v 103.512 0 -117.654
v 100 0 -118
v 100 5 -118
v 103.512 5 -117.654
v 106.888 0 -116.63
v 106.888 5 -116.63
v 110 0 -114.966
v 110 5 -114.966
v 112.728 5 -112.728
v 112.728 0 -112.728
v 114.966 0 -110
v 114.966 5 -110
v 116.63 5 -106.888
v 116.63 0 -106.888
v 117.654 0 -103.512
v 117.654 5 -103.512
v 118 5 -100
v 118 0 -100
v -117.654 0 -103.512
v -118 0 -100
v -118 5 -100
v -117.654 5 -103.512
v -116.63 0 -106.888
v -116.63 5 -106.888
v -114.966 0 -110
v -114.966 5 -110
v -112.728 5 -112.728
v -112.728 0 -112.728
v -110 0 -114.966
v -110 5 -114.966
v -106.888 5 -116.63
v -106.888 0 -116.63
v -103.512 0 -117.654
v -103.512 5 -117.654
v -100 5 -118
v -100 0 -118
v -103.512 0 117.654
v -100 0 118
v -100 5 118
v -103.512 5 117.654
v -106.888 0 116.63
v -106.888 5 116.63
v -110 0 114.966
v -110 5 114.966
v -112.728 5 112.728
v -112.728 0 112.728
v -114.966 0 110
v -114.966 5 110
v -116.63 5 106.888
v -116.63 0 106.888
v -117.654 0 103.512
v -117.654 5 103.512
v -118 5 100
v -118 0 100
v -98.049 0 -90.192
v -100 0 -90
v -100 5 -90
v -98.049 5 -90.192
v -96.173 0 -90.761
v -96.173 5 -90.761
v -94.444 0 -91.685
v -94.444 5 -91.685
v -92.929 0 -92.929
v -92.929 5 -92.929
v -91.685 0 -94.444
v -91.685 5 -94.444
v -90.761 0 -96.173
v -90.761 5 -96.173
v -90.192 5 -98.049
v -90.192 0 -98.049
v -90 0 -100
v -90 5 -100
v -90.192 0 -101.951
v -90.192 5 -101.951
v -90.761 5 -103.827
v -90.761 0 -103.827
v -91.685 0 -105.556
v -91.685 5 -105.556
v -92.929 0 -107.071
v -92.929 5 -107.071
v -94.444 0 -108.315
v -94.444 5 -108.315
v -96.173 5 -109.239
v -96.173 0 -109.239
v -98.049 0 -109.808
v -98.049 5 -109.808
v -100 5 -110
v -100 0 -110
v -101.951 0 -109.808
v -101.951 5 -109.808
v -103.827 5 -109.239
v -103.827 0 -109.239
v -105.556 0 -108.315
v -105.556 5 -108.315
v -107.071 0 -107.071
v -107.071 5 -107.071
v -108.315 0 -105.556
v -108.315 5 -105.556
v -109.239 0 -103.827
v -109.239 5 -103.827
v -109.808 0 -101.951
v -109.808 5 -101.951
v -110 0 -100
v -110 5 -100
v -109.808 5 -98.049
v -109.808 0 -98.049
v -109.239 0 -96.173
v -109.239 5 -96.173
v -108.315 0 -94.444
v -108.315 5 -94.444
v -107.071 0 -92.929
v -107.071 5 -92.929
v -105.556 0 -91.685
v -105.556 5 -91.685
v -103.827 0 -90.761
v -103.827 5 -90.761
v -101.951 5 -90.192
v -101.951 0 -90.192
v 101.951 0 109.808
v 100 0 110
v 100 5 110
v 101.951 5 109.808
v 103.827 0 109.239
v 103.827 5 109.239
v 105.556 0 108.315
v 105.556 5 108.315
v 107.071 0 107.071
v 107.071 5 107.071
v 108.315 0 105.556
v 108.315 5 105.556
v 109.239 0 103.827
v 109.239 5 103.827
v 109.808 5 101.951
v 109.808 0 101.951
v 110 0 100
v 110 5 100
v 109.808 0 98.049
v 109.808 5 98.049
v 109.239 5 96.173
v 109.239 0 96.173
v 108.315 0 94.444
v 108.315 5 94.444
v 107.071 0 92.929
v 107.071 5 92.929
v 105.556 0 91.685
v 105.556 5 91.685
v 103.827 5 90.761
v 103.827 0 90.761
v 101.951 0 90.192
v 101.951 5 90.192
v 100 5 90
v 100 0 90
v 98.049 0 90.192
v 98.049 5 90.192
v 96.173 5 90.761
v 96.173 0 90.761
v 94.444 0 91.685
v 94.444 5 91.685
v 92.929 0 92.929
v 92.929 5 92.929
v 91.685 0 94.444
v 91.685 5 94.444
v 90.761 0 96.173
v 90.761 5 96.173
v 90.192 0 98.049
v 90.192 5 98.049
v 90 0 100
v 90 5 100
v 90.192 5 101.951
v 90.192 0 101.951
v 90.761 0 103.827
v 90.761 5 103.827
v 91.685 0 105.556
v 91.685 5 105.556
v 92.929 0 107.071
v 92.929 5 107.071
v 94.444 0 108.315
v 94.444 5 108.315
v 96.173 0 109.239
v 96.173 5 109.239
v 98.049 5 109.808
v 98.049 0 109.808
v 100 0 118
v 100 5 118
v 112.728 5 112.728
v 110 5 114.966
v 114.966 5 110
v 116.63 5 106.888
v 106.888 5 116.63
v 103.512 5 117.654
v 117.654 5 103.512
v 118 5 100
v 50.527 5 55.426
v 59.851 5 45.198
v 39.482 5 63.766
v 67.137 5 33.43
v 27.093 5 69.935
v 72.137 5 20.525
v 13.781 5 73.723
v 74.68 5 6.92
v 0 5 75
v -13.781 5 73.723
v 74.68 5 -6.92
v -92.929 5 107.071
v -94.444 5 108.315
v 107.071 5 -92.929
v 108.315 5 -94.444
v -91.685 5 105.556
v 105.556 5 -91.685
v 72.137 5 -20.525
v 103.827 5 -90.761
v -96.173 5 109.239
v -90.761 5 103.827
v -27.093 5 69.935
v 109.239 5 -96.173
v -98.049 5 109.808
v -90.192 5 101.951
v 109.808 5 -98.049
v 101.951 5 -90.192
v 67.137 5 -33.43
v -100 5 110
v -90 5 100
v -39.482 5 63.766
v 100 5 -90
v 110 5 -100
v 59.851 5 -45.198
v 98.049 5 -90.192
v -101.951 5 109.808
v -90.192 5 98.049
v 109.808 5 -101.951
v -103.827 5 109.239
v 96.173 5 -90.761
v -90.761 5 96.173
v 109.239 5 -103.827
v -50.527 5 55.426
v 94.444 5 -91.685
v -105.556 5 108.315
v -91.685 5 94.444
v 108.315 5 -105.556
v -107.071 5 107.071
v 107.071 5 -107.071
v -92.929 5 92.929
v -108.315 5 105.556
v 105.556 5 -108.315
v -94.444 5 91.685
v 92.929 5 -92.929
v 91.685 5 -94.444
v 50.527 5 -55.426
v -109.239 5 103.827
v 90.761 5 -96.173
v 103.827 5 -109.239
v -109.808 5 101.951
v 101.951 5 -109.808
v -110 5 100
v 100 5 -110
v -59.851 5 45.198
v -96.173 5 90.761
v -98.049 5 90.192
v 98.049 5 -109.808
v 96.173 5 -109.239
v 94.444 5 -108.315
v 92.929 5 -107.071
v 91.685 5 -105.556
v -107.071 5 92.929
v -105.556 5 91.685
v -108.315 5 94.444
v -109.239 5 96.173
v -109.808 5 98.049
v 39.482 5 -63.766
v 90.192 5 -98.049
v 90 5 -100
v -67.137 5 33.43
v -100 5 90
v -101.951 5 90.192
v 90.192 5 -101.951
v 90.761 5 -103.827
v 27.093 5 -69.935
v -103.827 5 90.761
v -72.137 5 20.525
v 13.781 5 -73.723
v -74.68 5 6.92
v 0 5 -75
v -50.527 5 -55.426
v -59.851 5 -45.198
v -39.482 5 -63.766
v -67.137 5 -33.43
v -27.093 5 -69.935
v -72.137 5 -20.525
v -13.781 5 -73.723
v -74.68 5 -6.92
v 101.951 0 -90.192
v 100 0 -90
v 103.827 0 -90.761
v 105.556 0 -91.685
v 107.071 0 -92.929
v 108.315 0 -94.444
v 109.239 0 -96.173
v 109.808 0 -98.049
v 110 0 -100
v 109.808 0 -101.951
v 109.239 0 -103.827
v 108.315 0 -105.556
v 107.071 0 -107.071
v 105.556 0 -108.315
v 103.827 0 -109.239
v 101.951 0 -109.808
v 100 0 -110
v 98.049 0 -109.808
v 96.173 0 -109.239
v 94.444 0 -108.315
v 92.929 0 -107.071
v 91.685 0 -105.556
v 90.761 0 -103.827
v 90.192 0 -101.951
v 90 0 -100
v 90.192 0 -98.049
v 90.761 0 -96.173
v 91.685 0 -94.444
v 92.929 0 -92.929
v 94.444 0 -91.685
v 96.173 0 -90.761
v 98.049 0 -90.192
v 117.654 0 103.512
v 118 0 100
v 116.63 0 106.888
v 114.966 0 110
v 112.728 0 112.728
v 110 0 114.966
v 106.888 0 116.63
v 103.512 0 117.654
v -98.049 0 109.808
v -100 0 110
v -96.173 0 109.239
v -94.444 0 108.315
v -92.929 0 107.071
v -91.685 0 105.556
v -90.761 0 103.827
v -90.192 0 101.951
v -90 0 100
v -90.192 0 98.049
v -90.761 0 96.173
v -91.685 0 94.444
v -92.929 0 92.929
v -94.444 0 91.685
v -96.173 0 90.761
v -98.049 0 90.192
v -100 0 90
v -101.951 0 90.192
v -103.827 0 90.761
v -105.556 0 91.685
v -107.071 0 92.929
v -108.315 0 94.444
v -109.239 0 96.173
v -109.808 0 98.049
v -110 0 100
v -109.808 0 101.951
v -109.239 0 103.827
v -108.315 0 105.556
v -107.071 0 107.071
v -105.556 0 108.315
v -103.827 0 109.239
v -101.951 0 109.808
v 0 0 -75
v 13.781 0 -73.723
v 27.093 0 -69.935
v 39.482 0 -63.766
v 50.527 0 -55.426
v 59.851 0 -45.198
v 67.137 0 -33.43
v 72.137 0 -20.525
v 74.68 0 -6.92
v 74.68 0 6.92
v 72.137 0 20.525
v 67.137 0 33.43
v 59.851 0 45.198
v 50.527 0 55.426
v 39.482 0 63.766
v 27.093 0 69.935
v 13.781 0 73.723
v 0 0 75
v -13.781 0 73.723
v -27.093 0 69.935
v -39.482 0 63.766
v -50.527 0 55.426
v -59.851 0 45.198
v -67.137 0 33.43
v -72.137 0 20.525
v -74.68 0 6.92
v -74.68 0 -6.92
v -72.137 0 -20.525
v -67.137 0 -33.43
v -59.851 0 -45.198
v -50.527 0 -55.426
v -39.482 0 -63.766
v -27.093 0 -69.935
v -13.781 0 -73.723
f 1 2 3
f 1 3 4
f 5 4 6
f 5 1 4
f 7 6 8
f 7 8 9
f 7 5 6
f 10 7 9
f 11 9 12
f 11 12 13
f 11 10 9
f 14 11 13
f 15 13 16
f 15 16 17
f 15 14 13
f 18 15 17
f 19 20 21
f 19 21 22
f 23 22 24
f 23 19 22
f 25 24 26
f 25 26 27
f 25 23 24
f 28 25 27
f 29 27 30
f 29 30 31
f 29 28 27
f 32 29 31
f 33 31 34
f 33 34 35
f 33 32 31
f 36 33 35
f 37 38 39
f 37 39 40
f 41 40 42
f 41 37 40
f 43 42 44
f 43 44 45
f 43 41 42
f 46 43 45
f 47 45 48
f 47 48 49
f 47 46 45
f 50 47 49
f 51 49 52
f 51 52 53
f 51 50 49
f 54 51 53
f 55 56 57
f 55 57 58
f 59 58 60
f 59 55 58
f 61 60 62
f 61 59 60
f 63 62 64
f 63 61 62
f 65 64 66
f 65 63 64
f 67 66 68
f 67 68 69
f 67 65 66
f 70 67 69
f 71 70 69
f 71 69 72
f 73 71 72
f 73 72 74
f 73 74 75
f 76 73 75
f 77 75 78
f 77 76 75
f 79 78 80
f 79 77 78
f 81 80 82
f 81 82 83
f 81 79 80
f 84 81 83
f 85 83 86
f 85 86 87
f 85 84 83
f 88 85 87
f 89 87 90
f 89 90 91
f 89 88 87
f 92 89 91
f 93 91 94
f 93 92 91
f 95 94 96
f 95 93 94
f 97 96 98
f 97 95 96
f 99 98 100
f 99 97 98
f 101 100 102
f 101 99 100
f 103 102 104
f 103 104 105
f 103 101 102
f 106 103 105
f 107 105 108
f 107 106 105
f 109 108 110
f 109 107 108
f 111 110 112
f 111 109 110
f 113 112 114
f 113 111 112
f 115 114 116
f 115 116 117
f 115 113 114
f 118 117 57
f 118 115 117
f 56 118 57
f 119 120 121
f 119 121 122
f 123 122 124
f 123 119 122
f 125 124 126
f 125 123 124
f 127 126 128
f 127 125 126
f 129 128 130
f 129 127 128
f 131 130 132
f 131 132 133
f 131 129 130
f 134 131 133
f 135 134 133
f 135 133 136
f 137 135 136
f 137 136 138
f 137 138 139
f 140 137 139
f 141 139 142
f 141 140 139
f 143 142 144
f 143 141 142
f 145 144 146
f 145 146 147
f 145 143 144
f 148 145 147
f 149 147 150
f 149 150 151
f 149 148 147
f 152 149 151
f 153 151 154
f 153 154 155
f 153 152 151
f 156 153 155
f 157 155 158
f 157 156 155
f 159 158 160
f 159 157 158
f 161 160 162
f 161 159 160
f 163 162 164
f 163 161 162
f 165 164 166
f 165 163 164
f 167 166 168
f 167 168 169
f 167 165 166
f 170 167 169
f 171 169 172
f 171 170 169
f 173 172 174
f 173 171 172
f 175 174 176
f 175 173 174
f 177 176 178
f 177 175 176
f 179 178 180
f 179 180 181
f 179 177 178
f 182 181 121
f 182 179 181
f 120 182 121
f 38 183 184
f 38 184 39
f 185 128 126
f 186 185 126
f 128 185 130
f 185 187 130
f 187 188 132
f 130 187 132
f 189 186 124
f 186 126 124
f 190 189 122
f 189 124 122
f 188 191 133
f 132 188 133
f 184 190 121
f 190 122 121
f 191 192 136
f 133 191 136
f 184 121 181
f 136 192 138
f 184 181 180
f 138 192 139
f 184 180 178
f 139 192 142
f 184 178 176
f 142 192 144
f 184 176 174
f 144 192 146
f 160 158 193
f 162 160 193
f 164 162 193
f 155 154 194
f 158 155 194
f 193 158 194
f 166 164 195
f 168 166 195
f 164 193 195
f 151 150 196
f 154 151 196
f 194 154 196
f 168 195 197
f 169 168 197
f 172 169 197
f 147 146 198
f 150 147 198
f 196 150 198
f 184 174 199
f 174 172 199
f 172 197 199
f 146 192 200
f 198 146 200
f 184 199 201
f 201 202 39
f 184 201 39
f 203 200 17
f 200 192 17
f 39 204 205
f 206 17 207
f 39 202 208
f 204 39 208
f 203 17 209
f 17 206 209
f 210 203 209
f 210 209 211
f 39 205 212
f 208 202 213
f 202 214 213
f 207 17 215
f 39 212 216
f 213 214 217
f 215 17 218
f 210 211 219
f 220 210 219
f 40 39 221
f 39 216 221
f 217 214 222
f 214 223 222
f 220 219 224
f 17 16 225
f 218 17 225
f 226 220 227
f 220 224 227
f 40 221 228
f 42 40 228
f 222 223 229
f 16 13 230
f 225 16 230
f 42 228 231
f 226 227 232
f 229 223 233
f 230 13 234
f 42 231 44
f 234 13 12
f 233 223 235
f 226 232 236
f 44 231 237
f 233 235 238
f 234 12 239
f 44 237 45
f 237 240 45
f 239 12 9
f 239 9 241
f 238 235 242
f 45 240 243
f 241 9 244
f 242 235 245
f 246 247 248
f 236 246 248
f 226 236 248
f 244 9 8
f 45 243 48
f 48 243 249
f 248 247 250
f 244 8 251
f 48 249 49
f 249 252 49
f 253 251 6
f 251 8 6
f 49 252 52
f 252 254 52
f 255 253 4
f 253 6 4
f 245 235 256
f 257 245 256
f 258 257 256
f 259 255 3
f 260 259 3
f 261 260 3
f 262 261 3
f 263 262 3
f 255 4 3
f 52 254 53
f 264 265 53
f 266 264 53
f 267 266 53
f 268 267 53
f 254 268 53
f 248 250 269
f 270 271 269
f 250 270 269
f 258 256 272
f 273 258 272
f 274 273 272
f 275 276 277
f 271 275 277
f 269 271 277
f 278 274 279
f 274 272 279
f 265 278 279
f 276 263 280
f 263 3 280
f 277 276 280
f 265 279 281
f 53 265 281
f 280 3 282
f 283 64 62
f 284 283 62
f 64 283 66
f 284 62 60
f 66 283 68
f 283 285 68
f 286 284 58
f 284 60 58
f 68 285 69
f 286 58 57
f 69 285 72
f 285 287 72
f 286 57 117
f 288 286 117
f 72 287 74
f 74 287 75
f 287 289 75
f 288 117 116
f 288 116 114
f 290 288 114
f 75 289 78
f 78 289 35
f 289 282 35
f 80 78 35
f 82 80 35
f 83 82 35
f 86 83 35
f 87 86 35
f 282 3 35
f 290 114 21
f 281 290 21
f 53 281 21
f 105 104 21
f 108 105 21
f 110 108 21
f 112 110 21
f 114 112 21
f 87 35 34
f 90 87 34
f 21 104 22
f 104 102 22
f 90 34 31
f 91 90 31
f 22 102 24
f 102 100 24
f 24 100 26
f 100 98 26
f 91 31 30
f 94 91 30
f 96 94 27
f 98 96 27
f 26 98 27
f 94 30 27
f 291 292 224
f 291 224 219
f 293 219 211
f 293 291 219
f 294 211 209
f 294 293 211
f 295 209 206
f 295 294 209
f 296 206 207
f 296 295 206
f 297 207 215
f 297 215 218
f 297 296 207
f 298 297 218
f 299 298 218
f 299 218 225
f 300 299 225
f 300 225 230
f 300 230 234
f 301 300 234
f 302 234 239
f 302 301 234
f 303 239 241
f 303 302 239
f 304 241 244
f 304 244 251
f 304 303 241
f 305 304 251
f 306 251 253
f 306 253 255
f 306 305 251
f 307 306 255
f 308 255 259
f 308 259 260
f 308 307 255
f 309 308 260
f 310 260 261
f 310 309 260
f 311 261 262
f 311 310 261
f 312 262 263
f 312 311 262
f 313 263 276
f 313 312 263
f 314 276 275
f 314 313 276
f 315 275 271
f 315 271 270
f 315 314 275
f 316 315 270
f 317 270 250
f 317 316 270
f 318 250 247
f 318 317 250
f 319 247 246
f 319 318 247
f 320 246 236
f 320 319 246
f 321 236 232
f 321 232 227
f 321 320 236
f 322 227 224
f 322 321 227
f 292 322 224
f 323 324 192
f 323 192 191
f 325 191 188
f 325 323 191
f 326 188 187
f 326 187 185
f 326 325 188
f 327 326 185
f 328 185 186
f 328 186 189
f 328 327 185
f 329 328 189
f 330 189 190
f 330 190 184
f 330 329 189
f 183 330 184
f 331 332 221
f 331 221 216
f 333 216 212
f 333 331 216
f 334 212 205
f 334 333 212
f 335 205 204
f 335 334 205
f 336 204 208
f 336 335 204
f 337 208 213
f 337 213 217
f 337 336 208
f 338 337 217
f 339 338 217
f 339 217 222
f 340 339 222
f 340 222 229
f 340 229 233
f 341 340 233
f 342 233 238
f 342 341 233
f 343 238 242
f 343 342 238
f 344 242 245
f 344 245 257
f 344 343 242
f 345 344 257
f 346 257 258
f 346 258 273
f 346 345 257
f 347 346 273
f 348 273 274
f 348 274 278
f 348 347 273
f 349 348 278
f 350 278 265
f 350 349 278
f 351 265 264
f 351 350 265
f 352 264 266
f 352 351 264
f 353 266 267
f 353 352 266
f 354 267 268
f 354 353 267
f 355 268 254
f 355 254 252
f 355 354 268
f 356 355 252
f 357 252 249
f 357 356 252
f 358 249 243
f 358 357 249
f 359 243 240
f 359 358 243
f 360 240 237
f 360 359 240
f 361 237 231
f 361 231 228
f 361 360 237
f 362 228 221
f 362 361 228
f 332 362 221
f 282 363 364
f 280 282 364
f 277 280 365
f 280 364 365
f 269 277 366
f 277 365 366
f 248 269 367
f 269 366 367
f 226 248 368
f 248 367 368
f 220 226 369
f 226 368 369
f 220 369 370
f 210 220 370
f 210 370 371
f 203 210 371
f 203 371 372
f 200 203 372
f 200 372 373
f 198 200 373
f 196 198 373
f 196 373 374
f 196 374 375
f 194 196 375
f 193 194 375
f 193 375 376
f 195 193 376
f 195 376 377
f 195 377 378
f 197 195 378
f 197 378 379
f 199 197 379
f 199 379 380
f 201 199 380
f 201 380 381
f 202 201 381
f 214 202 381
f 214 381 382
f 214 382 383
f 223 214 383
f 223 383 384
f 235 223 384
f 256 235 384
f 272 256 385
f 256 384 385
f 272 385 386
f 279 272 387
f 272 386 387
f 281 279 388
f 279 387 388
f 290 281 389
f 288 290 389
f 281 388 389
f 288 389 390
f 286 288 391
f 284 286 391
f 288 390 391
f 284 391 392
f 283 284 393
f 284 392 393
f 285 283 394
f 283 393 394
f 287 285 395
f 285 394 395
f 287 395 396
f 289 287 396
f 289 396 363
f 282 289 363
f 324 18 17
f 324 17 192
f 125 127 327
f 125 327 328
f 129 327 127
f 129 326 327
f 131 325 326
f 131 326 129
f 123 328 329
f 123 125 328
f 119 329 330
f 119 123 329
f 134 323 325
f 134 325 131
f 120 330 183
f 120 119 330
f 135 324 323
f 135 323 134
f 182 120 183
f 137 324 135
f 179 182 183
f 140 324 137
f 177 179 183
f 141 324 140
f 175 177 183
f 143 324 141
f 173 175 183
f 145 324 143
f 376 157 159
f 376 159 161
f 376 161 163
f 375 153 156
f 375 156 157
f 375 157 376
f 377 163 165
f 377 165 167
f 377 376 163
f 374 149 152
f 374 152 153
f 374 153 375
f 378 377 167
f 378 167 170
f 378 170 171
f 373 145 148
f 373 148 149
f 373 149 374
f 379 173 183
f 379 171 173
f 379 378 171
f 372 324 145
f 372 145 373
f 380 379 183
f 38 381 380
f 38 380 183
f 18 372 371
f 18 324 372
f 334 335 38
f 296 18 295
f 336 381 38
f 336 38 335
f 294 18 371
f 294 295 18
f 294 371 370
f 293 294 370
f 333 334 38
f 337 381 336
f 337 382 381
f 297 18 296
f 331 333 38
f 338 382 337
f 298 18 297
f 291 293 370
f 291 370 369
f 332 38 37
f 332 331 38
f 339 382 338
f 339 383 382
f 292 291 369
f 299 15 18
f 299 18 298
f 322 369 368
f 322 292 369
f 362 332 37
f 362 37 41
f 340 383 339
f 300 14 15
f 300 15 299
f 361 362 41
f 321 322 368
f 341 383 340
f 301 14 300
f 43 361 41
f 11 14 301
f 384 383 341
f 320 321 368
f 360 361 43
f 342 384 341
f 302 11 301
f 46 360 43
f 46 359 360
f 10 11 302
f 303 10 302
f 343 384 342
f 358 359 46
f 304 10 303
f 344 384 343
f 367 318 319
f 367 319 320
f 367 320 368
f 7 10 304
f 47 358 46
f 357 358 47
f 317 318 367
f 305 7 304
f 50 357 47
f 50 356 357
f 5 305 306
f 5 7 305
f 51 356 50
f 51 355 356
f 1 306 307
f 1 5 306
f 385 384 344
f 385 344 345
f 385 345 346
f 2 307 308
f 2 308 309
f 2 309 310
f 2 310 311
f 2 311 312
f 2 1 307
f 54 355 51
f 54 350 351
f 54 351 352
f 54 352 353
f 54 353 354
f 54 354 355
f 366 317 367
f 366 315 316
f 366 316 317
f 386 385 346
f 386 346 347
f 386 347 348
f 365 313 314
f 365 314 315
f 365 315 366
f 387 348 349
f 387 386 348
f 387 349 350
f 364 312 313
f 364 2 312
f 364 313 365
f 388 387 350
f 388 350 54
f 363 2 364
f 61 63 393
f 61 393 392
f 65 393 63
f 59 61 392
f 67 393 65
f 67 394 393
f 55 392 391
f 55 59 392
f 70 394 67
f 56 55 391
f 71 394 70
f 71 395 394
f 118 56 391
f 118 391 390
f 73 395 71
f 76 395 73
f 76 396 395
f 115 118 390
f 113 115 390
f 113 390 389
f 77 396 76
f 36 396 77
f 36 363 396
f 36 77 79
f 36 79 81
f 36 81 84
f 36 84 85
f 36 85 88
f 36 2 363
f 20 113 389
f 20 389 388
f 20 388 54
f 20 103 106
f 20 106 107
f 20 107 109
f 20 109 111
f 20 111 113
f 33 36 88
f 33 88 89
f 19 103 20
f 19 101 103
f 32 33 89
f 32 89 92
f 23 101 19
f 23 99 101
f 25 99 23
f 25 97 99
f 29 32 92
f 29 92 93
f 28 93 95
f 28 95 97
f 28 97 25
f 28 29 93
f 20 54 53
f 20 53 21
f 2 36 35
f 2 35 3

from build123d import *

# Parameters (mm, degrees)
SKETCH_1_R          = 10
EXTRUDE_1_DEPTH     = 5
SKETCH_2_R          = 75
CUT_EXTRUDE_1_DEPTH = 167.952088936


with BuildPart() as part:
    # 草图1 → 凸台-拉伸1 (new body)
    with BuildSketch(Plane(origin=(0, 0, 0), x_dir=(1, 0, 0), z_dir=(0, 1, 0))):
        with BuildLine():
            Line((-100, 118), (100, 118))
            ThreePointArc((100, 118), (112.727922061, 112.727922061), (118, 100))
            Line((118, 100), (118, -100))
            ThreePointArc((118, -100), (112.727922061, -112.727922061), (100, -118))
            Line((100, -118), (-100, -118))
            ThreePointArc((-100, -118), (-112.727922061, -112.727922061), (-118, -100))
            Line((-118, -100), (-118, 100))
            ThreePointArc((-118, 100), (-112.727922061, 112.727922061), (-100, 118))
        make_face()
        with Locations(Location((100, 100, 0), (0, 0, 270))):
            Circle(SKETCH_1_R, mode=Mode.SUBTRACT)
        with Locations(Location((100, -100, 0), (0, 0, 270))):
            Circle(SKETCH_1_R, mode=Mode.SUBTRACT)
        with Locations(Location((-100, -100, 0), (0, 0, 270))):
            Circle(SKETCH_1_R, mode=Mode.SUBTRACT)
        with Locations(Location((-100, 100, 0), (0, 0, 270))):
            Circle(SKETCH_1_R, mode=Mode.SUBTRACT)
    extrude(amount=EXTRUDE_1_DEPTH)

    # 草图2 → 切除-拉伸1 (cut, through all)
    with BuildSketch(Plane.XZ):
        with Locations(Location((0, 0, 0), (0, 0, 270))):
            Circle(SKETCH_2_R)
    extrude(amount=-CUT_EXTRUDE_1_DEPTH, mode=Mode.SUBTRACT)


solid = part.part
